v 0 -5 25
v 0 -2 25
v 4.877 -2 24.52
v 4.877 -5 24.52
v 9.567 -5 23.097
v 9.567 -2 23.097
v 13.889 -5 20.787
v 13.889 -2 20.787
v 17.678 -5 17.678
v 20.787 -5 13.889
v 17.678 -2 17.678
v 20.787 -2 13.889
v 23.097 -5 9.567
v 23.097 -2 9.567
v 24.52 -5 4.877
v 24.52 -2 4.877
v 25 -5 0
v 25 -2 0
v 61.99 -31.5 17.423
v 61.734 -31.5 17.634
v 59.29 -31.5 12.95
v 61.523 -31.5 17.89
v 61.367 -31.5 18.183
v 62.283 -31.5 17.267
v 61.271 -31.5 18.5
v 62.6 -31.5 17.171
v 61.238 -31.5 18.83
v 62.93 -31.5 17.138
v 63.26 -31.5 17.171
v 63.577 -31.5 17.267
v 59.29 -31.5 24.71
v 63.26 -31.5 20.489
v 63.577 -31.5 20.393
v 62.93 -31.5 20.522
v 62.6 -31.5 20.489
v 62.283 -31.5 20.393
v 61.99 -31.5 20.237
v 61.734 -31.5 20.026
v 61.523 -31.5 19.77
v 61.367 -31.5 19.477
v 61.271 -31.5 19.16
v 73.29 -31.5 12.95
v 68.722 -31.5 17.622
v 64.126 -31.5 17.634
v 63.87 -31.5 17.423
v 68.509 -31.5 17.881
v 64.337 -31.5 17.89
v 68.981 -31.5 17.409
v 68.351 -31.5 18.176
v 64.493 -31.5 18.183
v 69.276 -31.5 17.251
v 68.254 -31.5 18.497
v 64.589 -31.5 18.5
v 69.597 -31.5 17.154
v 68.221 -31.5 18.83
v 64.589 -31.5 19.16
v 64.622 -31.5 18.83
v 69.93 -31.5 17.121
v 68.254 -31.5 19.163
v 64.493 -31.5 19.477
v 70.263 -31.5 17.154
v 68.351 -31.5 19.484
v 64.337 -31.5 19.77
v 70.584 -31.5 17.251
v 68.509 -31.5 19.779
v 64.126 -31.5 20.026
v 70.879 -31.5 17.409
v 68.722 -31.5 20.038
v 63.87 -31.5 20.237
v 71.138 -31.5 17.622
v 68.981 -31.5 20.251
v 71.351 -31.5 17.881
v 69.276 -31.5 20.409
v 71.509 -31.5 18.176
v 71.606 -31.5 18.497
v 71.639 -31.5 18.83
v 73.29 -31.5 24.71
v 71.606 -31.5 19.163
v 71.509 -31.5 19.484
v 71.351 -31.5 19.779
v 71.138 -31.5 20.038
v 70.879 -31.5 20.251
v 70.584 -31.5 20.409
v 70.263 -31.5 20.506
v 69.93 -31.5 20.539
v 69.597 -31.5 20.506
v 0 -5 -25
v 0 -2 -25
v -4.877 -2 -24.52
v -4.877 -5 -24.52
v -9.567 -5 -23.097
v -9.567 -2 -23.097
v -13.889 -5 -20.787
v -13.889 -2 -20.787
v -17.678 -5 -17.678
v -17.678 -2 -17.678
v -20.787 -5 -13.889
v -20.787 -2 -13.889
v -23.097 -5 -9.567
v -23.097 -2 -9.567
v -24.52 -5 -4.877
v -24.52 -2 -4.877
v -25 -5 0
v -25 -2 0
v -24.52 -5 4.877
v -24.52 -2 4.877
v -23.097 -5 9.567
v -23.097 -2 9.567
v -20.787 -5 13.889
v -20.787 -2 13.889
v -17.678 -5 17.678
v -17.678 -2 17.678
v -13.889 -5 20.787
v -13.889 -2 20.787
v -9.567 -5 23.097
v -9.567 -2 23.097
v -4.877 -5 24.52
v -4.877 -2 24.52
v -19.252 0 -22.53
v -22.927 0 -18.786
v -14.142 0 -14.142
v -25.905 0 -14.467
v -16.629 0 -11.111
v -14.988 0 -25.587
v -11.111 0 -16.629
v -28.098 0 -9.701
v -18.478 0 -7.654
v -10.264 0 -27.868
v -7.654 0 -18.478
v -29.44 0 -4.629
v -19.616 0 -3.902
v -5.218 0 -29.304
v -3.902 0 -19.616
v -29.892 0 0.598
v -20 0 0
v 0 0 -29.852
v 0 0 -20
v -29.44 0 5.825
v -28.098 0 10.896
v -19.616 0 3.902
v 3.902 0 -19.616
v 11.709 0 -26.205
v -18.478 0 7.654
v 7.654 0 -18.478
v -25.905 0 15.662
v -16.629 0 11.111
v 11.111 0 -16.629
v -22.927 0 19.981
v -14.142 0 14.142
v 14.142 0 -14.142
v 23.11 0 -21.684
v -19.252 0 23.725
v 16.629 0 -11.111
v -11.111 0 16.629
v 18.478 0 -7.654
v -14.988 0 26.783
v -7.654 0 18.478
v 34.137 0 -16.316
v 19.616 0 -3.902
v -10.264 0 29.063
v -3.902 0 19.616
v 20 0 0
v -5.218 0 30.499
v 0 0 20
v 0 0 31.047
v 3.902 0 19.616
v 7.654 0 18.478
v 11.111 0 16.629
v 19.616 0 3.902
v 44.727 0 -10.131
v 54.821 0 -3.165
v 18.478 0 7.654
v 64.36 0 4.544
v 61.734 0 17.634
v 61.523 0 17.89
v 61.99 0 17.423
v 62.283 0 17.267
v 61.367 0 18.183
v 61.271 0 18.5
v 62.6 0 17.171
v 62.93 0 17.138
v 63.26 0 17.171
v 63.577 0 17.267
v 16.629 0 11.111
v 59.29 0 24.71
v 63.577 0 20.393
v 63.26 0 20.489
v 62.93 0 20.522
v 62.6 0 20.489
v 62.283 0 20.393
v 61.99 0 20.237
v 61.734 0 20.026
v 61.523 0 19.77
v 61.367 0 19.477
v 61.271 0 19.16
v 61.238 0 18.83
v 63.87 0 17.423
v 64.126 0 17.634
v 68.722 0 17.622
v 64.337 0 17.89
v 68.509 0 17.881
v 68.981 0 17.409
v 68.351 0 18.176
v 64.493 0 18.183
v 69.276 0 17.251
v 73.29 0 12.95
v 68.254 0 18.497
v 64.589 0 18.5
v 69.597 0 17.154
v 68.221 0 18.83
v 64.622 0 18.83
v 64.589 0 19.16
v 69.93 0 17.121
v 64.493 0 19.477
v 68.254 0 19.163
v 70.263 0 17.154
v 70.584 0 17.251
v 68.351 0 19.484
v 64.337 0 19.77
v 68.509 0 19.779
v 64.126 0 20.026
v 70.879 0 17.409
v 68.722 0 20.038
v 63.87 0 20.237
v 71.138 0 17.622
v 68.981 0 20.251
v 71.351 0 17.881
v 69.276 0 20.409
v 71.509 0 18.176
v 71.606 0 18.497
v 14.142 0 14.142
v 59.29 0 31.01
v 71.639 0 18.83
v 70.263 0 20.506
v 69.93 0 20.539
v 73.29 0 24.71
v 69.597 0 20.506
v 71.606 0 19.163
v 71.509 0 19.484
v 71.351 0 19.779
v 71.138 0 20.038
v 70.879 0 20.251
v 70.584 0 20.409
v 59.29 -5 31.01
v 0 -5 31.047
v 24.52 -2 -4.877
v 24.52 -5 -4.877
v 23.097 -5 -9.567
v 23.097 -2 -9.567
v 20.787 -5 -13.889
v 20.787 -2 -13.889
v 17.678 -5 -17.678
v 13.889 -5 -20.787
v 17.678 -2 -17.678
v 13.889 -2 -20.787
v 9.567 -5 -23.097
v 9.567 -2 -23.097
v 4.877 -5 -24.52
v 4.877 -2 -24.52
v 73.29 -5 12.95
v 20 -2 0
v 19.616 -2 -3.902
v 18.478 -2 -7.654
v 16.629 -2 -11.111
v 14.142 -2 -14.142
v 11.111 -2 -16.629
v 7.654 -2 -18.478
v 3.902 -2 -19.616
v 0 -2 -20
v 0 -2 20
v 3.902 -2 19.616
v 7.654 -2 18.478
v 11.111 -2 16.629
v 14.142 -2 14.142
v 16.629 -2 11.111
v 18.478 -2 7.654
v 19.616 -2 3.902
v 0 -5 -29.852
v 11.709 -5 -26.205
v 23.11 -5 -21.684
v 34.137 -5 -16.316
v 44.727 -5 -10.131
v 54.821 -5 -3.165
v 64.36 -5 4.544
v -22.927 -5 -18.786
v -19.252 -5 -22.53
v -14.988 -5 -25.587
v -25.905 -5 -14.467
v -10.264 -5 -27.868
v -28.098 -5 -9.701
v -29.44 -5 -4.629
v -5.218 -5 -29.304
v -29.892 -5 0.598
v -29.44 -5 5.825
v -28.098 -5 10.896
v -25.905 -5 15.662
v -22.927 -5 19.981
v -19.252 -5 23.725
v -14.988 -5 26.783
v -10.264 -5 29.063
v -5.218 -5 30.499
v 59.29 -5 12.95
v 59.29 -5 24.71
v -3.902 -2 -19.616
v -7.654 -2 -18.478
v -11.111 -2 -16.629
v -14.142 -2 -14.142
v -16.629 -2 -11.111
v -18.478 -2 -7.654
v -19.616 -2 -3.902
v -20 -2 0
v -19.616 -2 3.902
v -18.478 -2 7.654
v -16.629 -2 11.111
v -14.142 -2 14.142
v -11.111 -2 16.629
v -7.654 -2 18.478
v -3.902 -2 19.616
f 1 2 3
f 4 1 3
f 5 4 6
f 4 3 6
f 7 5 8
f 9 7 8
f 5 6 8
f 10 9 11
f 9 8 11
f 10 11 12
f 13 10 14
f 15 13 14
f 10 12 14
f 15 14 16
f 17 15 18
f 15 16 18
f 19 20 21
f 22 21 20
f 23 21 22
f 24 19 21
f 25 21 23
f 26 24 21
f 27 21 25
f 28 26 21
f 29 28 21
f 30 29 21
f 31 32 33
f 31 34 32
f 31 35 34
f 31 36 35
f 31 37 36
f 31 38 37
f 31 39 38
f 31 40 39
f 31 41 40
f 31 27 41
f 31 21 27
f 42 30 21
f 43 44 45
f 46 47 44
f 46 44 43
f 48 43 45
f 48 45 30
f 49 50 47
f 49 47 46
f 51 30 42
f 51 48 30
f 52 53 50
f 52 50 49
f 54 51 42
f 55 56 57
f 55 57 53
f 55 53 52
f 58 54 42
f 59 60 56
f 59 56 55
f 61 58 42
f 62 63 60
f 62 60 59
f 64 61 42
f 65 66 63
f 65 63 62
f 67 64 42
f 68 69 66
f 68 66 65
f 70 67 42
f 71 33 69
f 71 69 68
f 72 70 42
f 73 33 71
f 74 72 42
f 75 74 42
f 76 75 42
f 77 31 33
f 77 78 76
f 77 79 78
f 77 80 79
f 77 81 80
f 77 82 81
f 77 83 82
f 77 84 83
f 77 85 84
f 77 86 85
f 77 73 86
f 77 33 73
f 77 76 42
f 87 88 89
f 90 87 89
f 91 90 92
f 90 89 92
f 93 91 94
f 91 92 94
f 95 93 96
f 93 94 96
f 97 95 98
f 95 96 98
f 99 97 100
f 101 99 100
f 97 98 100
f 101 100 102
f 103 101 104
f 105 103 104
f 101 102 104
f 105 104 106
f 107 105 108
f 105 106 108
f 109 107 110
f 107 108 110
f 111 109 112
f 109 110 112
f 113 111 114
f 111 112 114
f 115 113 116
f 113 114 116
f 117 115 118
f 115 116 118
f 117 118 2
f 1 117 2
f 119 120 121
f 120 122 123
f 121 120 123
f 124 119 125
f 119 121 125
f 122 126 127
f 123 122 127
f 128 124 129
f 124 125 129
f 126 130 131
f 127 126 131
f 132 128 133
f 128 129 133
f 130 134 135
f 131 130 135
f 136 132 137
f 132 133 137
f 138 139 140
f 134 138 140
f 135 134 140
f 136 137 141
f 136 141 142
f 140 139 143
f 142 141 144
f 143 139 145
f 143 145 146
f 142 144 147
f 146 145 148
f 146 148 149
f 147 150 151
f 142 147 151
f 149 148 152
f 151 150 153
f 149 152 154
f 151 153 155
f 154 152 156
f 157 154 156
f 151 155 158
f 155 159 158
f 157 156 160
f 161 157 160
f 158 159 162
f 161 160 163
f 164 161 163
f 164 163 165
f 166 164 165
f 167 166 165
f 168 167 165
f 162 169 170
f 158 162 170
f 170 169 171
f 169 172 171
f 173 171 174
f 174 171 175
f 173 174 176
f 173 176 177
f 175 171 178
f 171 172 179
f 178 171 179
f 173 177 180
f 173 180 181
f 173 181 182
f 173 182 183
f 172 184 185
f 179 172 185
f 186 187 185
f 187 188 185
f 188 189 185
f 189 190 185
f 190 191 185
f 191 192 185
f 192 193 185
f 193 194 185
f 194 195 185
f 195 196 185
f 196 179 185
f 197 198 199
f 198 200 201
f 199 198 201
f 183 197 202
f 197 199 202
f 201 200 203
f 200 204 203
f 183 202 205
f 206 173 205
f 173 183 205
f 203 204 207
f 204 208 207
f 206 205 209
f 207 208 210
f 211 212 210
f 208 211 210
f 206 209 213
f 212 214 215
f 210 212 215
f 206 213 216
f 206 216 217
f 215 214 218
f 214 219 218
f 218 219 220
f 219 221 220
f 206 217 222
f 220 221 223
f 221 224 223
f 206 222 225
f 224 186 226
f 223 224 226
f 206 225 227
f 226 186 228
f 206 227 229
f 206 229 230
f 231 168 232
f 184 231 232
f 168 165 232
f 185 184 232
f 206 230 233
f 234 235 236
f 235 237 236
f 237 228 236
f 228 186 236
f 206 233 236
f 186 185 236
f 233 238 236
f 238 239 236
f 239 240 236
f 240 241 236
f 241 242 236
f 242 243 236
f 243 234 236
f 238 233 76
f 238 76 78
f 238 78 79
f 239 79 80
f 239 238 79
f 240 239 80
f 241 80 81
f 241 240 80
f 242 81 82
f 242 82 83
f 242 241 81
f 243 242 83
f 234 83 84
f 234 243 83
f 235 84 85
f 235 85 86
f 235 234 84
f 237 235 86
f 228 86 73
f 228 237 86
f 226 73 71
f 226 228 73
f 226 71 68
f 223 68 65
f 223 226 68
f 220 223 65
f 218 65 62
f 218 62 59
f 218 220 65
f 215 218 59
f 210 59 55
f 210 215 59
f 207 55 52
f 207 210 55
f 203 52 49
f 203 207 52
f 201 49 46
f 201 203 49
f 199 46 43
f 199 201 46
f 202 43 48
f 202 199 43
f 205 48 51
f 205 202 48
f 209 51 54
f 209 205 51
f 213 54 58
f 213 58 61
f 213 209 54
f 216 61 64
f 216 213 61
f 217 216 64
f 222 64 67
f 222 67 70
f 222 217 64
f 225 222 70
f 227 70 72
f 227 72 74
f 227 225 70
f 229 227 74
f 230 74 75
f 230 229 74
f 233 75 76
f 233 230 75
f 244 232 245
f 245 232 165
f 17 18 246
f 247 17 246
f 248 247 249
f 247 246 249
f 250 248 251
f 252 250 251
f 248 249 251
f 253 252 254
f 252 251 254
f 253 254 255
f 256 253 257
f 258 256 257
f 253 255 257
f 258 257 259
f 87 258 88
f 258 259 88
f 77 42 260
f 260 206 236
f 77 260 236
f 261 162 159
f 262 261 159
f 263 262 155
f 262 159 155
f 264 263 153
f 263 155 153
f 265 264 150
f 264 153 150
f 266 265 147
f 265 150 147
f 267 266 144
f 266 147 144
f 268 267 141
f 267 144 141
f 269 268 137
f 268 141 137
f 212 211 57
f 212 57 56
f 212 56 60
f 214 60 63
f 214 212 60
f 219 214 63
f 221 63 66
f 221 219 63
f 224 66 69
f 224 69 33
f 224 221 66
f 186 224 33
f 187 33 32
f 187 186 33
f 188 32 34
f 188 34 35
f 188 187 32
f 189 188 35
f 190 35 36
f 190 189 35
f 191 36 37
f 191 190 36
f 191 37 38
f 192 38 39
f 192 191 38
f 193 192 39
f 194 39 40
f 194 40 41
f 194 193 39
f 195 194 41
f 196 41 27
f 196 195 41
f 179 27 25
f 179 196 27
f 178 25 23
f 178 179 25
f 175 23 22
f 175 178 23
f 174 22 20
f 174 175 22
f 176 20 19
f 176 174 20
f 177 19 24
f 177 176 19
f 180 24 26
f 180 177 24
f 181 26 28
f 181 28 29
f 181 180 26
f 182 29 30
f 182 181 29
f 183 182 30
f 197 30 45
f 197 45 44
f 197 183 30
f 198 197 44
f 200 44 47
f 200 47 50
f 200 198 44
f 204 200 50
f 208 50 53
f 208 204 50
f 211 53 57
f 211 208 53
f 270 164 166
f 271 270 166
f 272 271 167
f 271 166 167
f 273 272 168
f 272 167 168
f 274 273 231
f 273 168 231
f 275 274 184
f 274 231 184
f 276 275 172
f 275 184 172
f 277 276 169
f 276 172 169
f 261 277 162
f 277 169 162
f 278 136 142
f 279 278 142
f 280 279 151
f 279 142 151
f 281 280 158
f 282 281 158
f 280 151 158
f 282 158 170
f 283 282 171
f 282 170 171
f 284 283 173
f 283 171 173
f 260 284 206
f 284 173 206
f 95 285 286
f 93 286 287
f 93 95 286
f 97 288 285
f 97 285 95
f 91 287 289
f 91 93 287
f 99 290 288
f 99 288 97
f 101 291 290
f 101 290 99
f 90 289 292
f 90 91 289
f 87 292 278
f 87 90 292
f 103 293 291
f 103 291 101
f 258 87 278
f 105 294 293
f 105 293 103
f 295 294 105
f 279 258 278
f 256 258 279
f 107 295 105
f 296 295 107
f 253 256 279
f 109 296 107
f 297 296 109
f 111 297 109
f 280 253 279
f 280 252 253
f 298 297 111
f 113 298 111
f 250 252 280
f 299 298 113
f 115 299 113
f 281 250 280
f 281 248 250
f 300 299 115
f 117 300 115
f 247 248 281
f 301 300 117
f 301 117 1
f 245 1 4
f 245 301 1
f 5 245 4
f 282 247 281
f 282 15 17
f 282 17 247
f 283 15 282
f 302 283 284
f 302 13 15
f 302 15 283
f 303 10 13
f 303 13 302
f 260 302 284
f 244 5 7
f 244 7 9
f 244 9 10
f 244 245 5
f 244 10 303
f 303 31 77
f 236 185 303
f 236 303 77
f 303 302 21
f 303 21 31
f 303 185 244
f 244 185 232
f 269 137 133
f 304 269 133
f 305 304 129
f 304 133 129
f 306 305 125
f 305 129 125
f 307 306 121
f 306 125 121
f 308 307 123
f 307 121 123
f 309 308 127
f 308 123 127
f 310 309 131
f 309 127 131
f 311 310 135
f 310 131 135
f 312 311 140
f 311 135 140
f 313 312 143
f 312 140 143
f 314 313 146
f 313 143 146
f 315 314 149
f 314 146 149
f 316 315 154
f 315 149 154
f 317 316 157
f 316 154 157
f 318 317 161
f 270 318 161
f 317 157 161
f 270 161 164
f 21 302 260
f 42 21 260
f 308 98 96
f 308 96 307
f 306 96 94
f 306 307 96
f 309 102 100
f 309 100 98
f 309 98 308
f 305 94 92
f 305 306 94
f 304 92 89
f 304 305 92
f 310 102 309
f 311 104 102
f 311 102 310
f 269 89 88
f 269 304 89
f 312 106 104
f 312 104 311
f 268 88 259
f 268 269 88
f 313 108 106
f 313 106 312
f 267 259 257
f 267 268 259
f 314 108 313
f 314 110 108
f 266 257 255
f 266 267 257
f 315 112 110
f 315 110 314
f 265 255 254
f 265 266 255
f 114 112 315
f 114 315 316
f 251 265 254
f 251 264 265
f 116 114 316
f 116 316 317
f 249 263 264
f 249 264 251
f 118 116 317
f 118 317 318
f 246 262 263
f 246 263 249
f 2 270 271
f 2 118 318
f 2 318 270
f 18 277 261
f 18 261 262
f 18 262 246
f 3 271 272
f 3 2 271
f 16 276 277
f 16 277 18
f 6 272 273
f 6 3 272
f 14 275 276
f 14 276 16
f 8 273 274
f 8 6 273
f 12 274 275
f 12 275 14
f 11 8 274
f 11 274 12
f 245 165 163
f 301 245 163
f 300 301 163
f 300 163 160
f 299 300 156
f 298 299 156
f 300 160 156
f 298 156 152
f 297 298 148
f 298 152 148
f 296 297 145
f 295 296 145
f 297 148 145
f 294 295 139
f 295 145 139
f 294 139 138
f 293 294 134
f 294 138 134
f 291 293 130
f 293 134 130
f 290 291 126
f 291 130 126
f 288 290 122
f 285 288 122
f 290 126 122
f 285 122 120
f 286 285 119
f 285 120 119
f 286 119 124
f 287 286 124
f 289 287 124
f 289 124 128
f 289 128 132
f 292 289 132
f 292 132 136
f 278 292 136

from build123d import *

# Parameters (mm, degrees)
F1_DEPTH = 5
F0_W     = 14.0000022948
F0_H     = 11.7600001395
F0_R     = 1.6916232852
F0_R_2   = 1.7089194305
F7_DEPTH = 31.5
F8_DEPTH = 2


# Not quite as in the source:
# - the program builds the solid bodies; features that only make, move or delete a surface that nothing else refers to are left out


with BuildPart() as f1:
    # F0 (on Front) → F1 (new body)
    with BuildSketch(Plane.XZ):
        with BuildLine():
            ThreePointArc((0, -25), (-25, 0), (0, 25))
            Line((0, 25), (0, 31.0474538393))
            ThreePointArc((0, 31.0474538393), (-29.8919830792, 0.5977015918), (0, -29.8520506557))
            Line((0, -29.8520506557), (0, -25))
        make_face()
        with BuildLine():
            ThreePointArc((0, 25), (17.6776695297, 17.6776695297), (25, 0))
            ThreePointArc((25, 0), (17.6776695297, -17.6776695297), (0, -25))
            Line((0, -25), (0, -29.8520506557))
            ThreePointArc((0, -29.8520506557), (39.4905936266, -13.3235446474), (73.2899941504, 12.9499975592))
            Line((73.2899941504, 12.9499975592), (59.2899918556, 12.9499975592))
            Line((59.2899918556, 12.9499975592), (59.2899918556, 24.7099976987))
            Line((59.2899918556, 24.7099976987), (59.2899918556, 31.0100000352))
            Line((59.2899918556, 31.0100000352), (0, 31.0474538393))
            Line((0, 31.0474538393), (0, 25))
        make_face()
    extrude(amount=F1_DEPTH)

    # F0 (on Front) → F7 (join)
    with BuildSketch(Plane.XZ):
        with Locations((66.289993003, 18.8299976289)):
            Rectangle(F0_W, F0_H)
        with Locations((62.9299916327, 18.8299976289)):
            Circle(F0_R, mode=Mode.SUBTRACT)
        with Locations((69.9299909174, 18.8299976289)):
            Circle(F0_R_2, mode=Mode.SUBTRACT)
    extrude(amount=F7_DEPTH)

    # F0 (on Front) → F8 (join)
    with BuildSketch(Plane.XZ):
        with BuildLine():
            ThreePointArc((0, -25), (17.6776695297, -17.6776695297), (25, 0))
            ThreePointArc((25, 0), (17.6776695297, 17.6776695297), (0, 25))
            Line((0, 25), (0, 20))
            ThreePointArc((0, 20), (14.1421356237, 14.1421356237), (20, 0))
            ThreePointArc((20, 0), (14.1421356237, -14.1421356237), (0, -20))
            Line((0, -20), (0, -25))
        make_face()
        with BuildLine():
            Line((0, 20), (0, 25))
            ThreePointArc((0, 25), (-25, 0), (0, -25))
            Line((0, -25), (0, -20))
            ThreePointArc((0, -20), (-20, 0), (0, 20))
        make_face()
    extrude(amount=F8_DEPTH)


solid = f1.part
